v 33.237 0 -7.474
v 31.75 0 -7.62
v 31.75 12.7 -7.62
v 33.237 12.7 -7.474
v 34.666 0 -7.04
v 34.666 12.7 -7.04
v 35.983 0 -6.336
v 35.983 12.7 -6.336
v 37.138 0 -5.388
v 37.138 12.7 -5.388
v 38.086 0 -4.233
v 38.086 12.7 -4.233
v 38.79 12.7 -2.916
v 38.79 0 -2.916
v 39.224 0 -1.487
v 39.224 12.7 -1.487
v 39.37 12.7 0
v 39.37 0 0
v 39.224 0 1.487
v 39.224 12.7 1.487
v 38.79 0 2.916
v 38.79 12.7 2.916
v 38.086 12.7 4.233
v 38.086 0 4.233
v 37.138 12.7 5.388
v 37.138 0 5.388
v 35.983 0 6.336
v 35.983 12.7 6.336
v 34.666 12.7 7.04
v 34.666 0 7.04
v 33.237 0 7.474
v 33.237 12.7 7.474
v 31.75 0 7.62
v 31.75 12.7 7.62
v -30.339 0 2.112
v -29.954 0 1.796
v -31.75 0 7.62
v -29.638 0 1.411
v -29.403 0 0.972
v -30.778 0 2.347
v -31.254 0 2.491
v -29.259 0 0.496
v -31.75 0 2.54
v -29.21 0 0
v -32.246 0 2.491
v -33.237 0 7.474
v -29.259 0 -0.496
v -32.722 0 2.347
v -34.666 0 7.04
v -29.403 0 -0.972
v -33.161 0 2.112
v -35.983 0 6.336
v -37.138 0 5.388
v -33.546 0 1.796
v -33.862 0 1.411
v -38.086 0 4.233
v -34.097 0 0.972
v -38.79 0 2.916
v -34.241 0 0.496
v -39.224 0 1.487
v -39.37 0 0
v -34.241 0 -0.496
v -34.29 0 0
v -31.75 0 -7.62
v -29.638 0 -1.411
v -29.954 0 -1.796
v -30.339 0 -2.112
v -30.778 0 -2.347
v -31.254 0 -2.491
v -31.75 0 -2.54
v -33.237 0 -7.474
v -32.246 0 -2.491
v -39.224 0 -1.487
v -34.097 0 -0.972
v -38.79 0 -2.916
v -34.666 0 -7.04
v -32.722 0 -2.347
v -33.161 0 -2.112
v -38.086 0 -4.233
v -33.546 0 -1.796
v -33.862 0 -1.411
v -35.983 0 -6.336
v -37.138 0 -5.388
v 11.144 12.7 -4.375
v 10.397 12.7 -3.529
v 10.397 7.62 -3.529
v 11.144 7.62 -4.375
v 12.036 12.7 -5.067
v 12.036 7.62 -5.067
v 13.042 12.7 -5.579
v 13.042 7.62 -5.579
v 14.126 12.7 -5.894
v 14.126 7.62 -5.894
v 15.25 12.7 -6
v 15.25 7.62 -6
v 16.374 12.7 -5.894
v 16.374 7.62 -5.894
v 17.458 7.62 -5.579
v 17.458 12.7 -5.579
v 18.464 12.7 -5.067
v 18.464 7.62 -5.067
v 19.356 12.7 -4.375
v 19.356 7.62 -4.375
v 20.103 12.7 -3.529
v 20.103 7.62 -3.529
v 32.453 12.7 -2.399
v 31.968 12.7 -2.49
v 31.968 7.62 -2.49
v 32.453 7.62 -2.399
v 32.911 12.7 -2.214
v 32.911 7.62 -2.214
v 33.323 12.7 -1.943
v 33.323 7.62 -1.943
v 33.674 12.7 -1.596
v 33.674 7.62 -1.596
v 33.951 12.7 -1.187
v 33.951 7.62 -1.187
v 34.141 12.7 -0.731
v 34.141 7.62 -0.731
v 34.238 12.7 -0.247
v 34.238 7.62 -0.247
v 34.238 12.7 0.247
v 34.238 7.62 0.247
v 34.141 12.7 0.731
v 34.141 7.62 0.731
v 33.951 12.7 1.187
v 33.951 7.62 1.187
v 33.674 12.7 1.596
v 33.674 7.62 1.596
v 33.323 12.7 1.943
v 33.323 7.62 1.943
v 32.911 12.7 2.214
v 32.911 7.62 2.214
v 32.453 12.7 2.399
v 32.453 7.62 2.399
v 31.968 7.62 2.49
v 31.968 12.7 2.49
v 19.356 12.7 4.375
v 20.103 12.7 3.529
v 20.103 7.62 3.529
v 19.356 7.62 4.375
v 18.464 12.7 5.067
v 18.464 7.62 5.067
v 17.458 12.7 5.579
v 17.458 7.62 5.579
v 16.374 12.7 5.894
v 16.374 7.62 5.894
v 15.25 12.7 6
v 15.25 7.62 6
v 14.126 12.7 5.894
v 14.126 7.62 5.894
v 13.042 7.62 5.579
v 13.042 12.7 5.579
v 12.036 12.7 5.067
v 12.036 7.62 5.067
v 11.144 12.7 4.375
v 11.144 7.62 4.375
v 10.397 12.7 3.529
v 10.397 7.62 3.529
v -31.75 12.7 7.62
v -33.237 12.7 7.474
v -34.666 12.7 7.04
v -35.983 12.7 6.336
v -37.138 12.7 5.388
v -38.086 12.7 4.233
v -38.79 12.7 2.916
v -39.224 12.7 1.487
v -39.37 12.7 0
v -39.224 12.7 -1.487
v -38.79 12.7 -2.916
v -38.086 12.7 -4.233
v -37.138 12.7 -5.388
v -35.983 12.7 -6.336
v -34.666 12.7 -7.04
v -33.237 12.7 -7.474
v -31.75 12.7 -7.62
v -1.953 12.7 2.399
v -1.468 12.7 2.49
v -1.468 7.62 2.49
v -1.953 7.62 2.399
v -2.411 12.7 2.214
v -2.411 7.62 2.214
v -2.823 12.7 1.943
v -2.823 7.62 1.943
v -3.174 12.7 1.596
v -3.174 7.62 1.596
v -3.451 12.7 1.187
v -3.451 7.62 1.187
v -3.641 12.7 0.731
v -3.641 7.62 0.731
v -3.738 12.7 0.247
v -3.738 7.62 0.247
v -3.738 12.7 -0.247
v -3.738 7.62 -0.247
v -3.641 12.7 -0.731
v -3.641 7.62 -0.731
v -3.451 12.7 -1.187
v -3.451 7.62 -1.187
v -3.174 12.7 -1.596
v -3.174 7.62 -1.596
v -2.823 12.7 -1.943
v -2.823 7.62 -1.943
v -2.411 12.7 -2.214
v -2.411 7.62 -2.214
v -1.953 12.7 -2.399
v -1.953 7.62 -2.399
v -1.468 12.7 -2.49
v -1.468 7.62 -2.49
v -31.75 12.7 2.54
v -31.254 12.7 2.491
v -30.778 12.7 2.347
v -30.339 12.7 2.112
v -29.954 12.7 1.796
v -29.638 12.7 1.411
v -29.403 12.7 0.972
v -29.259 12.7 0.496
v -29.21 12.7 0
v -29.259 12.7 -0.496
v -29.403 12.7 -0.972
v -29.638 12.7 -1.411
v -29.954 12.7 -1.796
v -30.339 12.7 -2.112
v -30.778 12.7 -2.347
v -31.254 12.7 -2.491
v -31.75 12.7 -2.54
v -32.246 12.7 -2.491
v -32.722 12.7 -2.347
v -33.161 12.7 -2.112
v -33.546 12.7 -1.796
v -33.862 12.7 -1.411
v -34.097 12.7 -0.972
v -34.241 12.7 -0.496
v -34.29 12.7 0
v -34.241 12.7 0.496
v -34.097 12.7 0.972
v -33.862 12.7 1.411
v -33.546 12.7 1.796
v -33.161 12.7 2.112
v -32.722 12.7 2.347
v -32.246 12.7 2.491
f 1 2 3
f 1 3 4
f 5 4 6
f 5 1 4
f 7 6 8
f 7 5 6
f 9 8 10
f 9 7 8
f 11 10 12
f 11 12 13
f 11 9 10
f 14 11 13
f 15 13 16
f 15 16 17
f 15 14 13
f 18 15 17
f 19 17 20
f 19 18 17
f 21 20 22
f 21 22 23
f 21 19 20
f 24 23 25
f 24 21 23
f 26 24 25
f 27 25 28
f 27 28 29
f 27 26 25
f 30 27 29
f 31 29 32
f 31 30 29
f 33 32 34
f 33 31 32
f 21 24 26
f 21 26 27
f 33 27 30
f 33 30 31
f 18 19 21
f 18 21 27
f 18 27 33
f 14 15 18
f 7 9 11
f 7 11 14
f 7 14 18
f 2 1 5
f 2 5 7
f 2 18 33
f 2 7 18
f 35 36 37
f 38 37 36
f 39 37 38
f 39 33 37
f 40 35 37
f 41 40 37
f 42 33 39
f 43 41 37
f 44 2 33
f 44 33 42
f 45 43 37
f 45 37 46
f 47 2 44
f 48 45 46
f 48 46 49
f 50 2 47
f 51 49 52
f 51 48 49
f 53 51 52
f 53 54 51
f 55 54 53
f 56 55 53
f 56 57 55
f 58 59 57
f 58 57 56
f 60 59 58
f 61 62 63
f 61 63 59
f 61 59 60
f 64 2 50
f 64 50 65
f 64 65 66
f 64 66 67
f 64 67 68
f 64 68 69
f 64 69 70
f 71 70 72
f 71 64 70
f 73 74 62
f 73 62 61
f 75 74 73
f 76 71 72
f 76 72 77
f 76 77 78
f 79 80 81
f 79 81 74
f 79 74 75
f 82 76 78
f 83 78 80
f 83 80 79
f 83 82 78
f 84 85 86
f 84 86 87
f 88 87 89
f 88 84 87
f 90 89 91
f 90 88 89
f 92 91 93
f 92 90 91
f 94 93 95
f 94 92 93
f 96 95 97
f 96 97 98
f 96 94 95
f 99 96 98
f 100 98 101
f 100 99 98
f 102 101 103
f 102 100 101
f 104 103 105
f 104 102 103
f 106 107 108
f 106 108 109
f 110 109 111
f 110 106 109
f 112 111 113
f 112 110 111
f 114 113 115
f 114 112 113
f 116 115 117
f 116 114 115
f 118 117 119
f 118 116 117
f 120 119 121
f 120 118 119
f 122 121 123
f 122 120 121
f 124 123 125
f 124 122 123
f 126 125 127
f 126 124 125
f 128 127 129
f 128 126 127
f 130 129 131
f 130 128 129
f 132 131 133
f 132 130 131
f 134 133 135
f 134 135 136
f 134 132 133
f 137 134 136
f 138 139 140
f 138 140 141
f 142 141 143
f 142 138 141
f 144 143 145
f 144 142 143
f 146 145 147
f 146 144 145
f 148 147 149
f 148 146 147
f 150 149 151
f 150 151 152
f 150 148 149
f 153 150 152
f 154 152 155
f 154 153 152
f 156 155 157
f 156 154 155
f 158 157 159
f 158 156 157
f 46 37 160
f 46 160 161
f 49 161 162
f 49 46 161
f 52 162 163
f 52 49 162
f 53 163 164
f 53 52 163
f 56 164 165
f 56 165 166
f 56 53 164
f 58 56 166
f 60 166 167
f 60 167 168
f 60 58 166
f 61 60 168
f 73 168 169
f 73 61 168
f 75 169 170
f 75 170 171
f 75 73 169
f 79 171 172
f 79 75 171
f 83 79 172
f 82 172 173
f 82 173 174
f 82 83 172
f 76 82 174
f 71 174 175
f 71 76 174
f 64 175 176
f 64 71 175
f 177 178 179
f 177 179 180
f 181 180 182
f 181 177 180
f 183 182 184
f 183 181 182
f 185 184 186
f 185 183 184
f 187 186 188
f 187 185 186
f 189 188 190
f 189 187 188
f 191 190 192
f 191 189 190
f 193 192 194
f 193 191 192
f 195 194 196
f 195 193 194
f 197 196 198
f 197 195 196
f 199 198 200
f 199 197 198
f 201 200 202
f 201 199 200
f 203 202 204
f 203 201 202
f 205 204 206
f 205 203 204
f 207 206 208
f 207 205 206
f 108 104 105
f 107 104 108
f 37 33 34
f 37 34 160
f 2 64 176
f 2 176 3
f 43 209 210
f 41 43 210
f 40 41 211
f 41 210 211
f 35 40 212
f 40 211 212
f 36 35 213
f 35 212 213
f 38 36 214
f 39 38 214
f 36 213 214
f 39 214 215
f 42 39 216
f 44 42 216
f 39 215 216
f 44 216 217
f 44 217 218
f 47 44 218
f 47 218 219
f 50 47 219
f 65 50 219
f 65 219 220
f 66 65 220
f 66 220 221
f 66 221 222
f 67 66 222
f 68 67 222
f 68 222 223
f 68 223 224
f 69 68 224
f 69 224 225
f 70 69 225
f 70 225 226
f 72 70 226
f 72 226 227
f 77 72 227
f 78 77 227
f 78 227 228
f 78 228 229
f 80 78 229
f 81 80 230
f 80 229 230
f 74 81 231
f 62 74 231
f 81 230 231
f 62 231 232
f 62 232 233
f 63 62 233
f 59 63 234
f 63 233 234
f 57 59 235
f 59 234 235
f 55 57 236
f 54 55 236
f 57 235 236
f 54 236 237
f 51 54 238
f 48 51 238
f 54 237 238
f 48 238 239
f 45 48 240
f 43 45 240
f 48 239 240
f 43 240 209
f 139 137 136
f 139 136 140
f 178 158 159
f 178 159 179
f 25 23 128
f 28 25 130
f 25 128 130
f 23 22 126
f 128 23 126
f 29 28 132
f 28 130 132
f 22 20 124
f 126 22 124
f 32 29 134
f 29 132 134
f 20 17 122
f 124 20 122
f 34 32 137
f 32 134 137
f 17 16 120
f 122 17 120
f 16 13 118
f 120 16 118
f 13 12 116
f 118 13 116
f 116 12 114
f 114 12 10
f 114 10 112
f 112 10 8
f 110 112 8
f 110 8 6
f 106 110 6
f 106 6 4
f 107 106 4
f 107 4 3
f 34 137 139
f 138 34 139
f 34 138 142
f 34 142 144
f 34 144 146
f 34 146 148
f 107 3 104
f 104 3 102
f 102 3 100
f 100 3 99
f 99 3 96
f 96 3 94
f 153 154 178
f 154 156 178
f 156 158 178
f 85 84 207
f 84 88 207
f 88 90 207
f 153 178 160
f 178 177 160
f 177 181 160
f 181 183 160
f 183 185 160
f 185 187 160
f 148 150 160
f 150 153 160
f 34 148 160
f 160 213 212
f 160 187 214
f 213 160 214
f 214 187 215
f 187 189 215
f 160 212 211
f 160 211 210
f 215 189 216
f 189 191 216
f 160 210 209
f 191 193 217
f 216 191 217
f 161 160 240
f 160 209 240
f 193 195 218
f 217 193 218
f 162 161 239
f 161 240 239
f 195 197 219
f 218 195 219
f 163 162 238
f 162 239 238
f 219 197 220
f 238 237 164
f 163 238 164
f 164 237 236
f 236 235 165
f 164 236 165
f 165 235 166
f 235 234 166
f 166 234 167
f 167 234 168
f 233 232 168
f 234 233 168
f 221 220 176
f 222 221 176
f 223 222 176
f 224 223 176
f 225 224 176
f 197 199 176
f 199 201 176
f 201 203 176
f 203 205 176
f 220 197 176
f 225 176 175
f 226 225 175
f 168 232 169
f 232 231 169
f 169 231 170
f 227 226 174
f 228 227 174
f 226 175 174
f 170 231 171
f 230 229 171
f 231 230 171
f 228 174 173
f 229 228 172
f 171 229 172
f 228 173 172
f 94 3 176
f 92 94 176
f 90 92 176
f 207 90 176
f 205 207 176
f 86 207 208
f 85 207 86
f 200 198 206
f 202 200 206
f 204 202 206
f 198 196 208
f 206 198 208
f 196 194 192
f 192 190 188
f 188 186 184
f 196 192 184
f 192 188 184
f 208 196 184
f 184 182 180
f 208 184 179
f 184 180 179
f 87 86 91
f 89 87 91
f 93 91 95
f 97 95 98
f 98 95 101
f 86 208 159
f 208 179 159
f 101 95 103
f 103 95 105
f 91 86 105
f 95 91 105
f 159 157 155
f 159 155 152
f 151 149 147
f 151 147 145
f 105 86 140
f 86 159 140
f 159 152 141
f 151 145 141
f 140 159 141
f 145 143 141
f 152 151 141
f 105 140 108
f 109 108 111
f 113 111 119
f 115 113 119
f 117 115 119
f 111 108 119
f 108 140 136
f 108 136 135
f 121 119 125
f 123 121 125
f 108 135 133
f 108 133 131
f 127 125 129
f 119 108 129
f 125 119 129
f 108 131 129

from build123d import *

# Parameters (mm, degrees)
BOSS_EXTRUDE1_DEPTH = 12.7
SKETCH4_R           = 2.54
CUT_EXTRUDE3_DEPTH  = 43.063657711
CUT_EXTRUDE6_DEPTH  = 5.08


with BuildPart() as part:
    # Sketch3 → Boss-Extrude1 (new body)
    with BuildSketch(Plane(origin=(0, 0, 0), x_dir=(1, 0, 0), z_dir=(0, 1, 0))):
        with BuildLine():
            Line((-31.75, 7.62), (31.75, 7.62))
            ThreePointArc((31.75, 7.62), (39.37, 0), (31.75, -7.62))
            Line((31.75, -7.62), (-31.75, -7.62))
            ThreePointArc((-31.75, -7.62), (-39.37, 0), (-31.75, 7.62))
        make_face()
    extrude(amount=BOSS_EXTRUDE1_DEPTH)

    # Sketch4 → Cut-Extrude3 (cut, through all)
    with BuildSketch(Plane(origin=(0, 12.7, 0), x_dir=(1, 0, 0), z_dir=(0, 1, 0))):
        with Locations(Location((-31.75, 0, 0), (0, 0, 270))):
            Circle(SKETCH4_R)
    extrude(amount=-CUT_EXTRUDE3_DEPTH, mode=Mode.SUBTRACT)

    # Sketch9 → Cut-Extrude6 (cut)
    with BuildSketch(Plane(origin=(0, 12.7, 0), x_dir=(-1, 0, 0), z_dir=(0, 1, 0))):
        with BuildLine():
            Line((1.467889357, -2.490486745), (-10.397234737, -3.528550595))
            ThreePointArc((-10.397234737, -3.528550595), (-15.25, -6), (-20.102765263, -3.528550595))
            Line((-20.102765263, -3.528550595), (-31.967889357, -2.490486745))
            ThreePointArc((-31.967889357, -2.490486745), (-34.25, 0), (-31.967889357, 2.490486745))
            Line((-31.967889357, 2.490486745), (-20.102765263, 3.528550595))
            ThreePointArc((-20.102765263, 3.528550595), (-15.25, 6), (-10.397234737, 3.528550595))
            Line((-10.397234737, 3.528550595), (1.467889357, 2.490486745))
            ThreePointArc((1.467889357, 2.490486745), (3.75, 0), (1.467889357, -2.490486745))
        make_face()
    extrude(amount=-CUT_EXTRUDE6_DEPTH, mode=Mode.SUBTRACT)


solid = part.part
